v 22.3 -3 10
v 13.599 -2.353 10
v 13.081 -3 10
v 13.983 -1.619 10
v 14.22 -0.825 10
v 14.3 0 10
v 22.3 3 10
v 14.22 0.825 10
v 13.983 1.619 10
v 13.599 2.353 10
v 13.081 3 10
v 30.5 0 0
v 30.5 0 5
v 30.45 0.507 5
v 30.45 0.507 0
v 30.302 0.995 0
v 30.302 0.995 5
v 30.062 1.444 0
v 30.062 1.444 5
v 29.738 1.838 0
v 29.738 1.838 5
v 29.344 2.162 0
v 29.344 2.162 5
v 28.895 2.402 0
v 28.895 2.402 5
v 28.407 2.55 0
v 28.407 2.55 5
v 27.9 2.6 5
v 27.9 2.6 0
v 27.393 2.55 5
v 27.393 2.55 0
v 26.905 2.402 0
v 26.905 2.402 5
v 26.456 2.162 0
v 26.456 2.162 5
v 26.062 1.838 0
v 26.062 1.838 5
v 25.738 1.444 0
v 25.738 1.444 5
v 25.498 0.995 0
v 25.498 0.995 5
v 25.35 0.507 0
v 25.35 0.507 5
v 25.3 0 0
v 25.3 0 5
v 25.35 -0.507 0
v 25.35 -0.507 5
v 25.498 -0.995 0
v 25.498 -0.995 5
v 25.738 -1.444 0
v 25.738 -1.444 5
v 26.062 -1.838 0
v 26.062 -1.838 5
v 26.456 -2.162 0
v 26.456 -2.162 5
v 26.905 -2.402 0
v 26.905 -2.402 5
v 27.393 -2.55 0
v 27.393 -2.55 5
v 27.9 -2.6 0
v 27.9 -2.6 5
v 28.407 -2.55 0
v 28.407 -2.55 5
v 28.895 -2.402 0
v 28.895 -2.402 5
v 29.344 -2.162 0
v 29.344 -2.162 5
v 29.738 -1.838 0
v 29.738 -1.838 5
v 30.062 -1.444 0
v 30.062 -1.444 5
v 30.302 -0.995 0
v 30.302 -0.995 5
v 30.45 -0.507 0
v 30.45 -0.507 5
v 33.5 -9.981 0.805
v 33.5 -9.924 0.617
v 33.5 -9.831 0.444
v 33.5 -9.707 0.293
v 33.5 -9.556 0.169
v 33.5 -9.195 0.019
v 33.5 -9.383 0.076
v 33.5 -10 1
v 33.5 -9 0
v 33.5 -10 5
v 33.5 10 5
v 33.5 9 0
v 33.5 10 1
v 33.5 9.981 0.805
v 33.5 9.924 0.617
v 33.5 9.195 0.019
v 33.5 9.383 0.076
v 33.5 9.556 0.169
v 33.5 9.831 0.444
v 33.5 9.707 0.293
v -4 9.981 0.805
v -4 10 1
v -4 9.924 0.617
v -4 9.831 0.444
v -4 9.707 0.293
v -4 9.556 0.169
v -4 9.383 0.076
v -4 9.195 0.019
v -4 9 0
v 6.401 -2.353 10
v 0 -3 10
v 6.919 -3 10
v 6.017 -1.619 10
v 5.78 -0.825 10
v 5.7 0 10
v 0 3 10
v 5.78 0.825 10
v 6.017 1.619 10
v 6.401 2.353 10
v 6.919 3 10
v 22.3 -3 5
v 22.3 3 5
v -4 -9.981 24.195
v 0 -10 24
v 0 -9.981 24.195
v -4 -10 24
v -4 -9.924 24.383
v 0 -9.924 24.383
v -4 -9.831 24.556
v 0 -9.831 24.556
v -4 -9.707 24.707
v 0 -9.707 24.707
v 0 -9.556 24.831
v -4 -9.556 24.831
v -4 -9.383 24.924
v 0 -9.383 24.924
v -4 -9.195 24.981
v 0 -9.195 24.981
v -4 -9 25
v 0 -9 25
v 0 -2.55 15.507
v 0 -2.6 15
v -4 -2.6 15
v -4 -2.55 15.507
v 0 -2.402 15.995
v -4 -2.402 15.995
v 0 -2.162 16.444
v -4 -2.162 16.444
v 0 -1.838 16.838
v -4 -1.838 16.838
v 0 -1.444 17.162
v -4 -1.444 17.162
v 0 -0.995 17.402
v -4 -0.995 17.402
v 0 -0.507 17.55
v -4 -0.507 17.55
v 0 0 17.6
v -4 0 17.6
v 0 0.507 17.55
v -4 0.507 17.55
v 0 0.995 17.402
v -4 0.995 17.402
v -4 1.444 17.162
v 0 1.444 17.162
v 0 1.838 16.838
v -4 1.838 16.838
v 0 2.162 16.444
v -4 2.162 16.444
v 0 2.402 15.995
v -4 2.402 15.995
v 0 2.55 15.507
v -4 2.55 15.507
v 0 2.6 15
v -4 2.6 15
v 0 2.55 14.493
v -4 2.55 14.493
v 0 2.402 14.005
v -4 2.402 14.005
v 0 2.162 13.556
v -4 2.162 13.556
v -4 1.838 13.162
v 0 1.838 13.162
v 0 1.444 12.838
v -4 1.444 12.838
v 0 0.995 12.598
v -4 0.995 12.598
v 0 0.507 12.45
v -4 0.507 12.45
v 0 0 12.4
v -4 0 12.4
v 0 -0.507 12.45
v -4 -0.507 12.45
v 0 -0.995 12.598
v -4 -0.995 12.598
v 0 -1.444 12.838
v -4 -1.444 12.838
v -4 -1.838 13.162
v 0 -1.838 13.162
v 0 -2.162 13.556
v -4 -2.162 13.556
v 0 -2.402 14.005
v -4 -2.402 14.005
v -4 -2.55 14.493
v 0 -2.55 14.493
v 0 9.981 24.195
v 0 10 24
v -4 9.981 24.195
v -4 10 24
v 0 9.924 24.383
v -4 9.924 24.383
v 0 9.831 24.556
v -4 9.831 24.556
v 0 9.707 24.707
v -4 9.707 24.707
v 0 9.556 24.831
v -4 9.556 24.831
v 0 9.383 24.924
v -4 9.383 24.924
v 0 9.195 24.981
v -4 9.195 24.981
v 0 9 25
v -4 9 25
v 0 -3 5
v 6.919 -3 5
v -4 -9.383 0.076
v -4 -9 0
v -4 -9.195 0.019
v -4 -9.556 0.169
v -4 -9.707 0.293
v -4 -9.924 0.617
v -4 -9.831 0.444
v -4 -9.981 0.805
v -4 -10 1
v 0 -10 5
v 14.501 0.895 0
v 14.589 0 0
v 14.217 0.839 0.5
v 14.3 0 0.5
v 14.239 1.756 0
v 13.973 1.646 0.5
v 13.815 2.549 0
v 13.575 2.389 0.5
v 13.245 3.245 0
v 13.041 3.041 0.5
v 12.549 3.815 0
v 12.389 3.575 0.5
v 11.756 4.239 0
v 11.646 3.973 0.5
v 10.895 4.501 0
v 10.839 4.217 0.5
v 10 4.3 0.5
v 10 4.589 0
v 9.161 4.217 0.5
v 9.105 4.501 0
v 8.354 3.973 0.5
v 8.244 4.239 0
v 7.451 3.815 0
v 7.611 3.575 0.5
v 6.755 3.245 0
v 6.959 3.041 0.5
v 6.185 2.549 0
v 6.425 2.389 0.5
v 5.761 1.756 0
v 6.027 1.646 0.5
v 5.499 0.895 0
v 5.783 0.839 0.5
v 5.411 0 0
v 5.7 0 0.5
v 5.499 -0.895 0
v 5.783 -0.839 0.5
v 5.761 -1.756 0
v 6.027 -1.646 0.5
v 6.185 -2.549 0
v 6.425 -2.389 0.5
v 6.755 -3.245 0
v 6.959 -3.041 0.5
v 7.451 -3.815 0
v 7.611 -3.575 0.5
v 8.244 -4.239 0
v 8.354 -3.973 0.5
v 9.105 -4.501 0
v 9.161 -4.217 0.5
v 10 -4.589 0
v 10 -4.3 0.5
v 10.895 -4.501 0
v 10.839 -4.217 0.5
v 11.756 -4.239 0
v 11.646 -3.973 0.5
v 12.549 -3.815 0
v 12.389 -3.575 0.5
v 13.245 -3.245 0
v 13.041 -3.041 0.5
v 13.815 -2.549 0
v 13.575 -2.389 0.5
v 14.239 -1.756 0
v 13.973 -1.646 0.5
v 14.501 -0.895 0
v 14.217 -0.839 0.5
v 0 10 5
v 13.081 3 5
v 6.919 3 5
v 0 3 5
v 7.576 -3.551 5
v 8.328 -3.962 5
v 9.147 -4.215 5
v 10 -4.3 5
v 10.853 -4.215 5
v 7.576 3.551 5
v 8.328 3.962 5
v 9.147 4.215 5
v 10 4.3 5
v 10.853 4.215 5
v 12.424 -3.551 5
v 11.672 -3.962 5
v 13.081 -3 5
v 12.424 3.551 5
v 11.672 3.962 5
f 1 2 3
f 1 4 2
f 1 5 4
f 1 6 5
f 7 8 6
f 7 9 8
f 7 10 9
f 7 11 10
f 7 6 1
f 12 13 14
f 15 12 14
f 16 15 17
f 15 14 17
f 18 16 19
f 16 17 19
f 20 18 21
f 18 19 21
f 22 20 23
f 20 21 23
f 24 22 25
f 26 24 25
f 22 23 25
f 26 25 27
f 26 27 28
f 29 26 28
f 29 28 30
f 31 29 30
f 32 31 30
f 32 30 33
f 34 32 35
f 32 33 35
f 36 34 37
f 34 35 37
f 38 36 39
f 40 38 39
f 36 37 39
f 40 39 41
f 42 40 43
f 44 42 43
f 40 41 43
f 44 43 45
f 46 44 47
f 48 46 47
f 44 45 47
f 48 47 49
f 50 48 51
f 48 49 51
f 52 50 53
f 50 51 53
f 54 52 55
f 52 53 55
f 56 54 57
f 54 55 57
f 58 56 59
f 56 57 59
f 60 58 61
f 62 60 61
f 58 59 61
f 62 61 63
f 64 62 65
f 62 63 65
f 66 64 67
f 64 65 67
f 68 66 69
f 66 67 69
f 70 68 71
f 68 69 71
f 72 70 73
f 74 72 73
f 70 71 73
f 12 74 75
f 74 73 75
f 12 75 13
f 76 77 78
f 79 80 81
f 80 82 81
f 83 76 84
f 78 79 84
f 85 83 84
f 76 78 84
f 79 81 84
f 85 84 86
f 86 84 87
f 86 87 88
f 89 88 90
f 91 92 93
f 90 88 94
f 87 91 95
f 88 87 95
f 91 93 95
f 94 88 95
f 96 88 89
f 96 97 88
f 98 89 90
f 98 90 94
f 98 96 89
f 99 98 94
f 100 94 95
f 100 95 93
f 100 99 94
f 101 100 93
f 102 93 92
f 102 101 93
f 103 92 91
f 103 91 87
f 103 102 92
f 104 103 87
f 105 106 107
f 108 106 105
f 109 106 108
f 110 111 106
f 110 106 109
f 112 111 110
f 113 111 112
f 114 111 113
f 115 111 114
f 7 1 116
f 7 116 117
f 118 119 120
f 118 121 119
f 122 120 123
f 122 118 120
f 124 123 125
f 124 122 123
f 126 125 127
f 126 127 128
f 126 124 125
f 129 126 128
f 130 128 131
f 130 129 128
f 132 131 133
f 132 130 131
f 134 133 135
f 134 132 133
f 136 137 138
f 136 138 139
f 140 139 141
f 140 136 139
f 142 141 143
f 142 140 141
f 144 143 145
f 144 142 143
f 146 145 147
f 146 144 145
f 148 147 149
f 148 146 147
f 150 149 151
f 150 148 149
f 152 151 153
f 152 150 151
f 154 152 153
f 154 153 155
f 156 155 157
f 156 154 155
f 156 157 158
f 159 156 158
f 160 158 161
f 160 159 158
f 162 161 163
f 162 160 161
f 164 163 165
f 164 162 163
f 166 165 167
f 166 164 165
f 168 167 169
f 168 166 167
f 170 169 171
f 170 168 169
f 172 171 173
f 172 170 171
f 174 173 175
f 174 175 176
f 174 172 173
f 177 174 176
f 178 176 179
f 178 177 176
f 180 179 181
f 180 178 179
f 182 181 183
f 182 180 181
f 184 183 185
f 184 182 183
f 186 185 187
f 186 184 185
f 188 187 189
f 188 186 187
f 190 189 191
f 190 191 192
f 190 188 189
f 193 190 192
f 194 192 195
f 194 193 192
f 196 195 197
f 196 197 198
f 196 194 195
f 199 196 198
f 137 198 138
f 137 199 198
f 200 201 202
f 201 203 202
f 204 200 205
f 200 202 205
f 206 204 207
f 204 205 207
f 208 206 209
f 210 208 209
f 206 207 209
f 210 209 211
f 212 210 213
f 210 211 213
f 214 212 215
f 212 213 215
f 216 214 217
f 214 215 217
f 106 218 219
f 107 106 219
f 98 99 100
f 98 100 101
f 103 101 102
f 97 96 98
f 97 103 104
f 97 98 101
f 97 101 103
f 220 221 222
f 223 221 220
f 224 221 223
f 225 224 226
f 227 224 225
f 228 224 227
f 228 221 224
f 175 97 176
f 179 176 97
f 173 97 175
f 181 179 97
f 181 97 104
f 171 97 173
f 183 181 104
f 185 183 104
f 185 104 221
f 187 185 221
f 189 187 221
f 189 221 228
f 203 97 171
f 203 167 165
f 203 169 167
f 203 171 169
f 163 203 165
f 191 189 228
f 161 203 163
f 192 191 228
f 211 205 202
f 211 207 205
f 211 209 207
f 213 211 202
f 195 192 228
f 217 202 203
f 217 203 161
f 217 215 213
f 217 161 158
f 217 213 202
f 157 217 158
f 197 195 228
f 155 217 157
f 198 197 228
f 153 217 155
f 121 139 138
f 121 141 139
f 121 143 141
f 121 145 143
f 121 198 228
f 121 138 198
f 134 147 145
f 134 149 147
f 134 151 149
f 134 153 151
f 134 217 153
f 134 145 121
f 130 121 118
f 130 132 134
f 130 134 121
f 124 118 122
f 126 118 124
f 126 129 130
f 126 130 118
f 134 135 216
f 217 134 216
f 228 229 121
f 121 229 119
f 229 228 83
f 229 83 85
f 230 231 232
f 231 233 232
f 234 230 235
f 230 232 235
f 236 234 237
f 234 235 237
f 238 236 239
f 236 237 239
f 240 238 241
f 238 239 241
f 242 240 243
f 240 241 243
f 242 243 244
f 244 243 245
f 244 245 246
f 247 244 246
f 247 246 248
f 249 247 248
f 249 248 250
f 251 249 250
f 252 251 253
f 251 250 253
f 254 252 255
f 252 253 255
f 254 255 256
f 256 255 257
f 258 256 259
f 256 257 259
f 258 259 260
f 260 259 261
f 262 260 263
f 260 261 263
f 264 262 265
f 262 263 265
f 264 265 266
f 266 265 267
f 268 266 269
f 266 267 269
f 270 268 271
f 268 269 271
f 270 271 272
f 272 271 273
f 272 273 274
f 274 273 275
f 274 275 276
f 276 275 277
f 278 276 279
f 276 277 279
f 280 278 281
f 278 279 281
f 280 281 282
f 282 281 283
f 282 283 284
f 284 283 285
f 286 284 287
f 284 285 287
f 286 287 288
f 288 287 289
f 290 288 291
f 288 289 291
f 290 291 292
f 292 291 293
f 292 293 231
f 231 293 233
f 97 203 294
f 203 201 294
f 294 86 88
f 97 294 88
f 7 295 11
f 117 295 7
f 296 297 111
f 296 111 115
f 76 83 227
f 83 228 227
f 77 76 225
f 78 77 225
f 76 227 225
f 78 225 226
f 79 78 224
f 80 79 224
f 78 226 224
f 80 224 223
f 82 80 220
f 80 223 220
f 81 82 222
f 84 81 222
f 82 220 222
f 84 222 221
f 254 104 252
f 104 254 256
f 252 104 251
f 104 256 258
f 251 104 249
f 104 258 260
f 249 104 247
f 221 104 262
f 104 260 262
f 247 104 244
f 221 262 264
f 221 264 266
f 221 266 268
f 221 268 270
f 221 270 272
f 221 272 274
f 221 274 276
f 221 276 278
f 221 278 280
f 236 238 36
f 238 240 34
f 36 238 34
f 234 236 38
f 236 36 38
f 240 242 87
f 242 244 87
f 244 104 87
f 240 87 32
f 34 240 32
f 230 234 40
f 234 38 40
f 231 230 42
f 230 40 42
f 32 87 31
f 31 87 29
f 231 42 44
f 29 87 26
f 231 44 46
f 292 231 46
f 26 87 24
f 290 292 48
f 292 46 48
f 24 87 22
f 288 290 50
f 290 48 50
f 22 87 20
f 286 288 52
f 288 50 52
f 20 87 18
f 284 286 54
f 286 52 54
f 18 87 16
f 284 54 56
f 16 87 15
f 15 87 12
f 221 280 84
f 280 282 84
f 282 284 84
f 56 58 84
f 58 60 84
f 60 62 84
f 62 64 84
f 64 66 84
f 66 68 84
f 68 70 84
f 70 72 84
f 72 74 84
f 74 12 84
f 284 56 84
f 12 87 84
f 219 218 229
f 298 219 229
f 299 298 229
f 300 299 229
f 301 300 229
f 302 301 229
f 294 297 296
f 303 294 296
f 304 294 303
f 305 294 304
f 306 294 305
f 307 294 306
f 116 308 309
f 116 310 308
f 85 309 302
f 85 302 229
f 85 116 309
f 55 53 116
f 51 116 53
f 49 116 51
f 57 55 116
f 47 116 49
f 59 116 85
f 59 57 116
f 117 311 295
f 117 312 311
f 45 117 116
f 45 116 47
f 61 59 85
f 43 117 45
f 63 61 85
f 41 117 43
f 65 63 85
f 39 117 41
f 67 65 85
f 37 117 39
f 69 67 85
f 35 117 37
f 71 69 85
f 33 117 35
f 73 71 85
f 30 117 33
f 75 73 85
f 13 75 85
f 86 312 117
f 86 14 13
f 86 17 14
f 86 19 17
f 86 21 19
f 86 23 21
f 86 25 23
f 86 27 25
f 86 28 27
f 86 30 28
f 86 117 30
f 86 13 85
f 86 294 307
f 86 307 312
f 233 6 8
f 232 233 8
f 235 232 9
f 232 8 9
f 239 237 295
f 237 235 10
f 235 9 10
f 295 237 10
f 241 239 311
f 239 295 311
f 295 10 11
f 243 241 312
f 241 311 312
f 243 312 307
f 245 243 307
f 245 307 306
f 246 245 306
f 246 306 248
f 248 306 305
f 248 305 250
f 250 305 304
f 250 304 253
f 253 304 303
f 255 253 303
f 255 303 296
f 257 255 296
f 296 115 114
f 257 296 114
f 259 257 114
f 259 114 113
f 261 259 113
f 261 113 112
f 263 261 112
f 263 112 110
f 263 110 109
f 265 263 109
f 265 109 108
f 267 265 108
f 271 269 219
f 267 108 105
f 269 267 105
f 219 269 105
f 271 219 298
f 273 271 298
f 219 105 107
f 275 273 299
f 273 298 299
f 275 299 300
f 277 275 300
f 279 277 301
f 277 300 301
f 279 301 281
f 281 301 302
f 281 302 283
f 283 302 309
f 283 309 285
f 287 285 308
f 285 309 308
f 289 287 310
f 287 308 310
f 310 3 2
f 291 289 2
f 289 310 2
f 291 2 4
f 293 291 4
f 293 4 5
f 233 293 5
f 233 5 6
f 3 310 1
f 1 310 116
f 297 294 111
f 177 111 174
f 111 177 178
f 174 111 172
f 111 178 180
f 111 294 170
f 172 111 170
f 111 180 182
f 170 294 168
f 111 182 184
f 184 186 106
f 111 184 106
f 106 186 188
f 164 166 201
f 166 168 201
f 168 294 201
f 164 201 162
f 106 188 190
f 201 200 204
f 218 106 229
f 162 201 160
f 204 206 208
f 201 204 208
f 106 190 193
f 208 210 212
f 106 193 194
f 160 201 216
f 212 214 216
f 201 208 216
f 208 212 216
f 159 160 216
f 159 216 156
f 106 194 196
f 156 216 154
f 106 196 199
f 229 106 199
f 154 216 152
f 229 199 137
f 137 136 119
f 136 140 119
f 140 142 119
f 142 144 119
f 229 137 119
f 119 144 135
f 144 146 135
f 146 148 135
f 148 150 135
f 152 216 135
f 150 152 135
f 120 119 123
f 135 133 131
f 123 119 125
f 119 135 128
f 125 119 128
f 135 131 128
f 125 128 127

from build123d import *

# Parameters (mm, degrees)
F0_W      = 33.5
F0_H      = 20
F1_DEPTH  = 5
F2_W      = 33.5
F2_H      = 6
F3_DEPTH  = 5
F4_R      = 4.3
F5_DEPTH  = 25
F6_W      = 11.2
F6_H      = 6
F7_DEPTH  = 5
F8_R      = 2.6
F9_DEPTH  = 5
F10_R     = 2.6
F11_DEPTH = 4
F12_R     = 1


# Not quite as in the source:
# - a fillet or chamfer that OpenCascade refuses, or shapes differently, is made with other operations: its cross-section is extruded or revolved along the edge and cut away or added
# - a feature names something its author has since deleted; it is built from what else it names


with BuildPart() as f1:
    # F0 (on Top) → F1 (new body)
    with BuildSketch(Plane.XY):
        with Locations((16.75, 0)):
            Rectangle(F0_W, F0_H)
    extrude(amount=F1_DEPTH)

    # F2 (on face) → F3 (join)
    with BuildSketch(Plane.XY.offset(5)):
        with Locations((16.75, 0)):
            Rectangle(F2_W, F2_H)
    extrude(amount=F3_DEPTH)

    # F4 (on face) → F5 (cut)
    with BuildSketch(Plane.XY.offset(10)):
        with Locations((10, 0)):
            Circle(F4_R)
    extrude(amount=-F5_DEPTH, mode=Mode.SUBTRACT)

    # F6 (on face) → F7 (cut, through all)
    with BuildSketch(Plane.XY.offset(10)):
        with Locations((27.9, 0)):
            Rectangle(F6_W, F6_H)
    extrude(amount=-F7_DEPTH, mode=Mode.SUBTRACT)

    # F8 (on face) → F9 (cut, through all)
    with BuildSketch(Plane.XY.offset(5)):
        with Locations((27.9, 0)):
            Circle(F8_R)
    extrude(amount=-F9_DEPTH, mode=Mode.SUBTRACT)

    # F10 (on face) → F11 (join)
    with BuildSketch(Plane(origin=(0, 0, 0), x_dir=(0, -1, 0), z_dir=(-1, 0, 0))):
        Polygon((-10, 25), (-10, 5), (-3, 5), (-3, 10), (3, 10), (3, 5), (10, 5), (10, 25), align=None)
        with Locations((0, 15)):
            Circle(F10_R, mode=Mode.SUBTRACT)
        Polygon((-10, 5), (-10, 0), (10, 0), (10, 5), (3, 5), (3, 10), (-3, 10), (-3, 5), align=None)
    extrude(amount=F11_DEPTH)

    # F12
    f12_edges = [f1.edges().sort_by_distance(p)[0] for p in [
        (-2, -10, 25),
        (-2, 10, 25),
        (14.75, -10, 0),
        (14.75, 10, 0),
    ]]
    fillet(f12_edges, radius=F12_R)

    # F13: chamfer of 0.5 x 0.2886751346 on 1 edges, made by hand

    # F13_s1 → F13_t2 (revolve, cut)
    with BuildSketch(Plane.XZ):
        Polygon((14.5886751346, 0), (14.3, 0.5), (14.3, 0), align=None)
    revolve(axis=Axis((10, 0, 0), (0, 0, 1)), mode=Mode.SUBTRACT)


solid = f1.part
